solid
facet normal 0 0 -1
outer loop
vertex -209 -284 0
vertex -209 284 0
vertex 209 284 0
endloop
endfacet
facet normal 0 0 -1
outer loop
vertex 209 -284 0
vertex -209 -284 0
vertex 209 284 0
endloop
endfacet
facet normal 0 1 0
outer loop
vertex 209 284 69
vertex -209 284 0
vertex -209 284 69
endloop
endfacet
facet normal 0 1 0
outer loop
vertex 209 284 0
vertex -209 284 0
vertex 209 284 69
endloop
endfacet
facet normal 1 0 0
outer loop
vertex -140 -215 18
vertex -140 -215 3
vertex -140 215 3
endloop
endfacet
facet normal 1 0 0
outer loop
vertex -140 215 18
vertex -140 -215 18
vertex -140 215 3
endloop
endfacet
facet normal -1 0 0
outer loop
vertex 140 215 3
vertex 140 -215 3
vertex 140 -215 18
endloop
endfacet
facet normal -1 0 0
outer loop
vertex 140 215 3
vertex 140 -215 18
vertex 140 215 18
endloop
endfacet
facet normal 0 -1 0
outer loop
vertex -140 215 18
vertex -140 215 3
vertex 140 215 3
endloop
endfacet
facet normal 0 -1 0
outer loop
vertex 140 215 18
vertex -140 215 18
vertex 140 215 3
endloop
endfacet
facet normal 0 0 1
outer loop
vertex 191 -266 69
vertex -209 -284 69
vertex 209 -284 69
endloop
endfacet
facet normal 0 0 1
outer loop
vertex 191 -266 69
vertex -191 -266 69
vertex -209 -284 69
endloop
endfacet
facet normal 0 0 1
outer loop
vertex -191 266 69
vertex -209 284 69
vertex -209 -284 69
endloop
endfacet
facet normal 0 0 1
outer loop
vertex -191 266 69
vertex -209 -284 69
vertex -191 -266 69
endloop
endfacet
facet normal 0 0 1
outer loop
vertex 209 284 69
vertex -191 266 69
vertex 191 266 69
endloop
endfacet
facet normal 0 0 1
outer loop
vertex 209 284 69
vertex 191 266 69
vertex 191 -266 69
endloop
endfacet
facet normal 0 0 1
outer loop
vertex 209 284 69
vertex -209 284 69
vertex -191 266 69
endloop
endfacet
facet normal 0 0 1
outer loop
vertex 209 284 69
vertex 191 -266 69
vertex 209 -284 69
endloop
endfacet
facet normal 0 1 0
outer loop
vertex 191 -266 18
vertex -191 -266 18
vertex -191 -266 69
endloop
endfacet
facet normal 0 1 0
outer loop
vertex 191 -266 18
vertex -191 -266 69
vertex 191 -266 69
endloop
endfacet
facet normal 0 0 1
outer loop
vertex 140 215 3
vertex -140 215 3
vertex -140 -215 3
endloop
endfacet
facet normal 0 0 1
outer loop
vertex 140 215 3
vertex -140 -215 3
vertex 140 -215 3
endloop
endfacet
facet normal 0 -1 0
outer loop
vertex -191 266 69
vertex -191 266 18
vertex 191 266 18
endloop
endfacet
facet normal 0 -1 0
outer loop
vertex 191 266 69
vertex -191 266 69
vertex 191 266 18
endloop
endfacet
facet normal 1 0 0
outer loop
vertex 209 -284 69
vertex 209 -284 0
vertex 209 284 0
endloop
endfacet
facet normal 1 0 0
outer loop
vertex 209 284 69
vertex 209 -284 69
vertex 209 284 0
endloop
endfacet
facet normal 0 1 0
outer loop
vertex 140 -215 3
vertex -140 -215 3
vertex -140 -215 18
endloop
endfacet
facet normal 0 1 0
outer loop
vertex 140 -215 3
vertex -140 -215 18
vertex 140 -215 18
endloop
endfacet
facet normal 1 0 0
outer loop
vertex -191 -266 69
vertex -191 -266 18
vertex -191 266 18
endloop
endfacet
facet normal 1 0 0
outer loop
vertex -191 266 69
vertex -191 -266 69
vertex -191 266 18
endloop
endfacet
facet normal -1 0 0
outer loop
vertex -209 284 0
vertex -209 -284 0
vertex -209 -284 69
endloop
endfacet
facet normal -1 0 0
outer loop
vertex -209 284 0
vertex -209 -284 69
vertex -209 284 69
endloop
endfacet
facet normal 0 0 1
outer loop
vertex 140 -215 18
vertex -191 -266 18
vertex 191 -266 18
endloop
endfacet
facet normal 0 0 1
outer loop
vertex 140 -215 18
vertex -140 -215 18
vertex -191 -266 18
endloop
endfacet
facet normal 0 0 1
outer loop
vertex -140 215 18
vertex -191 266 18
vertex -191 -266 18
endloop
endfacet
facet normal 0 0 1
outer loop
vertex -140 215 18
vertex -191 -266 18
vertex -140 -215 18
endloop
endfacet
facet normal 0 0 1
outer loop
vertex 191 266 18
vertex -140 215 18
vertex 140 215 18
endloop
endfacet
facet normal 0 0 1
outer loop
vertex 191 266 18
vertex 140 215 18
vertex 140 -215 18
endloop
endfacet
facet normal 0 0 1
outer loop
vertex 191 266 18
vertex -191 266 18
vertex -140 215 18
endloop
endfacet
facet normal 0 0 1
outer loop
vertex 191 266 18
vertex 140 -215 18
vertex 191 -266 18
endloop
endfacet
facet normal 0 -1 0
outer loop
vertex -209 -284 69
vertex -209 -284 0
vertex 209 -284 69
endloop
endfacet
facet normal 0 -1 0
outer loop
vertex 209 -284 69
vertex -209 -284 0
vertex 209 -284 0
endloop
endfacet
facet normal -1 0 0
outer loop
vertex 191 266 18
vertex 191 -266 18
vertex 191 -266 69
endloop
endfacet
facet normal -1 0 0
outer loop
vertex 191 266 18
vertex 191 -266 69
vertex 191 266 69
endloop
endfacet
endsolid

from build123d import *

# Parameters (mm, degrees)
F0_W     = 418
F0_H     = 568
F0_W_2   = 382.000006
F0_H_2   = 532.000006
F1_DEPTH = 69
F0_W_3   = 280
F0_H_3   = 430
F2_DEPTH = 18
F3_DEPTH = 3


with BuildPart() as f1:
    # F0 (on Top) → F1 (new body)
    with BuildSketch(Plane.XY):
        Rectangle(F0_W, F0_H)
        Rectangle(F0_W_2, F0_H_2, mode=Mode.SUBTRACT)
    extrude(amount=F1_DEPTH)

    # F0 (on Top) → F2 (join)
    with BuildSketch(Plane.XY):
        Rectangle(F0_W, F0_H)
        Rectangle(F0_W_2, F0_H_2, mode=Mode.SUBTRACT)
        Rectangle(F0_W_2, F0_H_2)
        Rectangle(F0_W_3, F0_H_3, mode=Mode.SUBTRACT)
    extrude(amount=F2_DEPTH)

    # F0 (on Top) → F3 (join)
    with BuildSketch(Plane.XY):
        Rectangle(F0_W_2, F0_H_2)
        Rectangle(F0_W_3, F0_H_3, mode=Mode.SUBTRACT)
        Rectangle(F0_W_3, F0_H_3)
    extrude(amount=F3_DEPTH)


solid = f1.part
